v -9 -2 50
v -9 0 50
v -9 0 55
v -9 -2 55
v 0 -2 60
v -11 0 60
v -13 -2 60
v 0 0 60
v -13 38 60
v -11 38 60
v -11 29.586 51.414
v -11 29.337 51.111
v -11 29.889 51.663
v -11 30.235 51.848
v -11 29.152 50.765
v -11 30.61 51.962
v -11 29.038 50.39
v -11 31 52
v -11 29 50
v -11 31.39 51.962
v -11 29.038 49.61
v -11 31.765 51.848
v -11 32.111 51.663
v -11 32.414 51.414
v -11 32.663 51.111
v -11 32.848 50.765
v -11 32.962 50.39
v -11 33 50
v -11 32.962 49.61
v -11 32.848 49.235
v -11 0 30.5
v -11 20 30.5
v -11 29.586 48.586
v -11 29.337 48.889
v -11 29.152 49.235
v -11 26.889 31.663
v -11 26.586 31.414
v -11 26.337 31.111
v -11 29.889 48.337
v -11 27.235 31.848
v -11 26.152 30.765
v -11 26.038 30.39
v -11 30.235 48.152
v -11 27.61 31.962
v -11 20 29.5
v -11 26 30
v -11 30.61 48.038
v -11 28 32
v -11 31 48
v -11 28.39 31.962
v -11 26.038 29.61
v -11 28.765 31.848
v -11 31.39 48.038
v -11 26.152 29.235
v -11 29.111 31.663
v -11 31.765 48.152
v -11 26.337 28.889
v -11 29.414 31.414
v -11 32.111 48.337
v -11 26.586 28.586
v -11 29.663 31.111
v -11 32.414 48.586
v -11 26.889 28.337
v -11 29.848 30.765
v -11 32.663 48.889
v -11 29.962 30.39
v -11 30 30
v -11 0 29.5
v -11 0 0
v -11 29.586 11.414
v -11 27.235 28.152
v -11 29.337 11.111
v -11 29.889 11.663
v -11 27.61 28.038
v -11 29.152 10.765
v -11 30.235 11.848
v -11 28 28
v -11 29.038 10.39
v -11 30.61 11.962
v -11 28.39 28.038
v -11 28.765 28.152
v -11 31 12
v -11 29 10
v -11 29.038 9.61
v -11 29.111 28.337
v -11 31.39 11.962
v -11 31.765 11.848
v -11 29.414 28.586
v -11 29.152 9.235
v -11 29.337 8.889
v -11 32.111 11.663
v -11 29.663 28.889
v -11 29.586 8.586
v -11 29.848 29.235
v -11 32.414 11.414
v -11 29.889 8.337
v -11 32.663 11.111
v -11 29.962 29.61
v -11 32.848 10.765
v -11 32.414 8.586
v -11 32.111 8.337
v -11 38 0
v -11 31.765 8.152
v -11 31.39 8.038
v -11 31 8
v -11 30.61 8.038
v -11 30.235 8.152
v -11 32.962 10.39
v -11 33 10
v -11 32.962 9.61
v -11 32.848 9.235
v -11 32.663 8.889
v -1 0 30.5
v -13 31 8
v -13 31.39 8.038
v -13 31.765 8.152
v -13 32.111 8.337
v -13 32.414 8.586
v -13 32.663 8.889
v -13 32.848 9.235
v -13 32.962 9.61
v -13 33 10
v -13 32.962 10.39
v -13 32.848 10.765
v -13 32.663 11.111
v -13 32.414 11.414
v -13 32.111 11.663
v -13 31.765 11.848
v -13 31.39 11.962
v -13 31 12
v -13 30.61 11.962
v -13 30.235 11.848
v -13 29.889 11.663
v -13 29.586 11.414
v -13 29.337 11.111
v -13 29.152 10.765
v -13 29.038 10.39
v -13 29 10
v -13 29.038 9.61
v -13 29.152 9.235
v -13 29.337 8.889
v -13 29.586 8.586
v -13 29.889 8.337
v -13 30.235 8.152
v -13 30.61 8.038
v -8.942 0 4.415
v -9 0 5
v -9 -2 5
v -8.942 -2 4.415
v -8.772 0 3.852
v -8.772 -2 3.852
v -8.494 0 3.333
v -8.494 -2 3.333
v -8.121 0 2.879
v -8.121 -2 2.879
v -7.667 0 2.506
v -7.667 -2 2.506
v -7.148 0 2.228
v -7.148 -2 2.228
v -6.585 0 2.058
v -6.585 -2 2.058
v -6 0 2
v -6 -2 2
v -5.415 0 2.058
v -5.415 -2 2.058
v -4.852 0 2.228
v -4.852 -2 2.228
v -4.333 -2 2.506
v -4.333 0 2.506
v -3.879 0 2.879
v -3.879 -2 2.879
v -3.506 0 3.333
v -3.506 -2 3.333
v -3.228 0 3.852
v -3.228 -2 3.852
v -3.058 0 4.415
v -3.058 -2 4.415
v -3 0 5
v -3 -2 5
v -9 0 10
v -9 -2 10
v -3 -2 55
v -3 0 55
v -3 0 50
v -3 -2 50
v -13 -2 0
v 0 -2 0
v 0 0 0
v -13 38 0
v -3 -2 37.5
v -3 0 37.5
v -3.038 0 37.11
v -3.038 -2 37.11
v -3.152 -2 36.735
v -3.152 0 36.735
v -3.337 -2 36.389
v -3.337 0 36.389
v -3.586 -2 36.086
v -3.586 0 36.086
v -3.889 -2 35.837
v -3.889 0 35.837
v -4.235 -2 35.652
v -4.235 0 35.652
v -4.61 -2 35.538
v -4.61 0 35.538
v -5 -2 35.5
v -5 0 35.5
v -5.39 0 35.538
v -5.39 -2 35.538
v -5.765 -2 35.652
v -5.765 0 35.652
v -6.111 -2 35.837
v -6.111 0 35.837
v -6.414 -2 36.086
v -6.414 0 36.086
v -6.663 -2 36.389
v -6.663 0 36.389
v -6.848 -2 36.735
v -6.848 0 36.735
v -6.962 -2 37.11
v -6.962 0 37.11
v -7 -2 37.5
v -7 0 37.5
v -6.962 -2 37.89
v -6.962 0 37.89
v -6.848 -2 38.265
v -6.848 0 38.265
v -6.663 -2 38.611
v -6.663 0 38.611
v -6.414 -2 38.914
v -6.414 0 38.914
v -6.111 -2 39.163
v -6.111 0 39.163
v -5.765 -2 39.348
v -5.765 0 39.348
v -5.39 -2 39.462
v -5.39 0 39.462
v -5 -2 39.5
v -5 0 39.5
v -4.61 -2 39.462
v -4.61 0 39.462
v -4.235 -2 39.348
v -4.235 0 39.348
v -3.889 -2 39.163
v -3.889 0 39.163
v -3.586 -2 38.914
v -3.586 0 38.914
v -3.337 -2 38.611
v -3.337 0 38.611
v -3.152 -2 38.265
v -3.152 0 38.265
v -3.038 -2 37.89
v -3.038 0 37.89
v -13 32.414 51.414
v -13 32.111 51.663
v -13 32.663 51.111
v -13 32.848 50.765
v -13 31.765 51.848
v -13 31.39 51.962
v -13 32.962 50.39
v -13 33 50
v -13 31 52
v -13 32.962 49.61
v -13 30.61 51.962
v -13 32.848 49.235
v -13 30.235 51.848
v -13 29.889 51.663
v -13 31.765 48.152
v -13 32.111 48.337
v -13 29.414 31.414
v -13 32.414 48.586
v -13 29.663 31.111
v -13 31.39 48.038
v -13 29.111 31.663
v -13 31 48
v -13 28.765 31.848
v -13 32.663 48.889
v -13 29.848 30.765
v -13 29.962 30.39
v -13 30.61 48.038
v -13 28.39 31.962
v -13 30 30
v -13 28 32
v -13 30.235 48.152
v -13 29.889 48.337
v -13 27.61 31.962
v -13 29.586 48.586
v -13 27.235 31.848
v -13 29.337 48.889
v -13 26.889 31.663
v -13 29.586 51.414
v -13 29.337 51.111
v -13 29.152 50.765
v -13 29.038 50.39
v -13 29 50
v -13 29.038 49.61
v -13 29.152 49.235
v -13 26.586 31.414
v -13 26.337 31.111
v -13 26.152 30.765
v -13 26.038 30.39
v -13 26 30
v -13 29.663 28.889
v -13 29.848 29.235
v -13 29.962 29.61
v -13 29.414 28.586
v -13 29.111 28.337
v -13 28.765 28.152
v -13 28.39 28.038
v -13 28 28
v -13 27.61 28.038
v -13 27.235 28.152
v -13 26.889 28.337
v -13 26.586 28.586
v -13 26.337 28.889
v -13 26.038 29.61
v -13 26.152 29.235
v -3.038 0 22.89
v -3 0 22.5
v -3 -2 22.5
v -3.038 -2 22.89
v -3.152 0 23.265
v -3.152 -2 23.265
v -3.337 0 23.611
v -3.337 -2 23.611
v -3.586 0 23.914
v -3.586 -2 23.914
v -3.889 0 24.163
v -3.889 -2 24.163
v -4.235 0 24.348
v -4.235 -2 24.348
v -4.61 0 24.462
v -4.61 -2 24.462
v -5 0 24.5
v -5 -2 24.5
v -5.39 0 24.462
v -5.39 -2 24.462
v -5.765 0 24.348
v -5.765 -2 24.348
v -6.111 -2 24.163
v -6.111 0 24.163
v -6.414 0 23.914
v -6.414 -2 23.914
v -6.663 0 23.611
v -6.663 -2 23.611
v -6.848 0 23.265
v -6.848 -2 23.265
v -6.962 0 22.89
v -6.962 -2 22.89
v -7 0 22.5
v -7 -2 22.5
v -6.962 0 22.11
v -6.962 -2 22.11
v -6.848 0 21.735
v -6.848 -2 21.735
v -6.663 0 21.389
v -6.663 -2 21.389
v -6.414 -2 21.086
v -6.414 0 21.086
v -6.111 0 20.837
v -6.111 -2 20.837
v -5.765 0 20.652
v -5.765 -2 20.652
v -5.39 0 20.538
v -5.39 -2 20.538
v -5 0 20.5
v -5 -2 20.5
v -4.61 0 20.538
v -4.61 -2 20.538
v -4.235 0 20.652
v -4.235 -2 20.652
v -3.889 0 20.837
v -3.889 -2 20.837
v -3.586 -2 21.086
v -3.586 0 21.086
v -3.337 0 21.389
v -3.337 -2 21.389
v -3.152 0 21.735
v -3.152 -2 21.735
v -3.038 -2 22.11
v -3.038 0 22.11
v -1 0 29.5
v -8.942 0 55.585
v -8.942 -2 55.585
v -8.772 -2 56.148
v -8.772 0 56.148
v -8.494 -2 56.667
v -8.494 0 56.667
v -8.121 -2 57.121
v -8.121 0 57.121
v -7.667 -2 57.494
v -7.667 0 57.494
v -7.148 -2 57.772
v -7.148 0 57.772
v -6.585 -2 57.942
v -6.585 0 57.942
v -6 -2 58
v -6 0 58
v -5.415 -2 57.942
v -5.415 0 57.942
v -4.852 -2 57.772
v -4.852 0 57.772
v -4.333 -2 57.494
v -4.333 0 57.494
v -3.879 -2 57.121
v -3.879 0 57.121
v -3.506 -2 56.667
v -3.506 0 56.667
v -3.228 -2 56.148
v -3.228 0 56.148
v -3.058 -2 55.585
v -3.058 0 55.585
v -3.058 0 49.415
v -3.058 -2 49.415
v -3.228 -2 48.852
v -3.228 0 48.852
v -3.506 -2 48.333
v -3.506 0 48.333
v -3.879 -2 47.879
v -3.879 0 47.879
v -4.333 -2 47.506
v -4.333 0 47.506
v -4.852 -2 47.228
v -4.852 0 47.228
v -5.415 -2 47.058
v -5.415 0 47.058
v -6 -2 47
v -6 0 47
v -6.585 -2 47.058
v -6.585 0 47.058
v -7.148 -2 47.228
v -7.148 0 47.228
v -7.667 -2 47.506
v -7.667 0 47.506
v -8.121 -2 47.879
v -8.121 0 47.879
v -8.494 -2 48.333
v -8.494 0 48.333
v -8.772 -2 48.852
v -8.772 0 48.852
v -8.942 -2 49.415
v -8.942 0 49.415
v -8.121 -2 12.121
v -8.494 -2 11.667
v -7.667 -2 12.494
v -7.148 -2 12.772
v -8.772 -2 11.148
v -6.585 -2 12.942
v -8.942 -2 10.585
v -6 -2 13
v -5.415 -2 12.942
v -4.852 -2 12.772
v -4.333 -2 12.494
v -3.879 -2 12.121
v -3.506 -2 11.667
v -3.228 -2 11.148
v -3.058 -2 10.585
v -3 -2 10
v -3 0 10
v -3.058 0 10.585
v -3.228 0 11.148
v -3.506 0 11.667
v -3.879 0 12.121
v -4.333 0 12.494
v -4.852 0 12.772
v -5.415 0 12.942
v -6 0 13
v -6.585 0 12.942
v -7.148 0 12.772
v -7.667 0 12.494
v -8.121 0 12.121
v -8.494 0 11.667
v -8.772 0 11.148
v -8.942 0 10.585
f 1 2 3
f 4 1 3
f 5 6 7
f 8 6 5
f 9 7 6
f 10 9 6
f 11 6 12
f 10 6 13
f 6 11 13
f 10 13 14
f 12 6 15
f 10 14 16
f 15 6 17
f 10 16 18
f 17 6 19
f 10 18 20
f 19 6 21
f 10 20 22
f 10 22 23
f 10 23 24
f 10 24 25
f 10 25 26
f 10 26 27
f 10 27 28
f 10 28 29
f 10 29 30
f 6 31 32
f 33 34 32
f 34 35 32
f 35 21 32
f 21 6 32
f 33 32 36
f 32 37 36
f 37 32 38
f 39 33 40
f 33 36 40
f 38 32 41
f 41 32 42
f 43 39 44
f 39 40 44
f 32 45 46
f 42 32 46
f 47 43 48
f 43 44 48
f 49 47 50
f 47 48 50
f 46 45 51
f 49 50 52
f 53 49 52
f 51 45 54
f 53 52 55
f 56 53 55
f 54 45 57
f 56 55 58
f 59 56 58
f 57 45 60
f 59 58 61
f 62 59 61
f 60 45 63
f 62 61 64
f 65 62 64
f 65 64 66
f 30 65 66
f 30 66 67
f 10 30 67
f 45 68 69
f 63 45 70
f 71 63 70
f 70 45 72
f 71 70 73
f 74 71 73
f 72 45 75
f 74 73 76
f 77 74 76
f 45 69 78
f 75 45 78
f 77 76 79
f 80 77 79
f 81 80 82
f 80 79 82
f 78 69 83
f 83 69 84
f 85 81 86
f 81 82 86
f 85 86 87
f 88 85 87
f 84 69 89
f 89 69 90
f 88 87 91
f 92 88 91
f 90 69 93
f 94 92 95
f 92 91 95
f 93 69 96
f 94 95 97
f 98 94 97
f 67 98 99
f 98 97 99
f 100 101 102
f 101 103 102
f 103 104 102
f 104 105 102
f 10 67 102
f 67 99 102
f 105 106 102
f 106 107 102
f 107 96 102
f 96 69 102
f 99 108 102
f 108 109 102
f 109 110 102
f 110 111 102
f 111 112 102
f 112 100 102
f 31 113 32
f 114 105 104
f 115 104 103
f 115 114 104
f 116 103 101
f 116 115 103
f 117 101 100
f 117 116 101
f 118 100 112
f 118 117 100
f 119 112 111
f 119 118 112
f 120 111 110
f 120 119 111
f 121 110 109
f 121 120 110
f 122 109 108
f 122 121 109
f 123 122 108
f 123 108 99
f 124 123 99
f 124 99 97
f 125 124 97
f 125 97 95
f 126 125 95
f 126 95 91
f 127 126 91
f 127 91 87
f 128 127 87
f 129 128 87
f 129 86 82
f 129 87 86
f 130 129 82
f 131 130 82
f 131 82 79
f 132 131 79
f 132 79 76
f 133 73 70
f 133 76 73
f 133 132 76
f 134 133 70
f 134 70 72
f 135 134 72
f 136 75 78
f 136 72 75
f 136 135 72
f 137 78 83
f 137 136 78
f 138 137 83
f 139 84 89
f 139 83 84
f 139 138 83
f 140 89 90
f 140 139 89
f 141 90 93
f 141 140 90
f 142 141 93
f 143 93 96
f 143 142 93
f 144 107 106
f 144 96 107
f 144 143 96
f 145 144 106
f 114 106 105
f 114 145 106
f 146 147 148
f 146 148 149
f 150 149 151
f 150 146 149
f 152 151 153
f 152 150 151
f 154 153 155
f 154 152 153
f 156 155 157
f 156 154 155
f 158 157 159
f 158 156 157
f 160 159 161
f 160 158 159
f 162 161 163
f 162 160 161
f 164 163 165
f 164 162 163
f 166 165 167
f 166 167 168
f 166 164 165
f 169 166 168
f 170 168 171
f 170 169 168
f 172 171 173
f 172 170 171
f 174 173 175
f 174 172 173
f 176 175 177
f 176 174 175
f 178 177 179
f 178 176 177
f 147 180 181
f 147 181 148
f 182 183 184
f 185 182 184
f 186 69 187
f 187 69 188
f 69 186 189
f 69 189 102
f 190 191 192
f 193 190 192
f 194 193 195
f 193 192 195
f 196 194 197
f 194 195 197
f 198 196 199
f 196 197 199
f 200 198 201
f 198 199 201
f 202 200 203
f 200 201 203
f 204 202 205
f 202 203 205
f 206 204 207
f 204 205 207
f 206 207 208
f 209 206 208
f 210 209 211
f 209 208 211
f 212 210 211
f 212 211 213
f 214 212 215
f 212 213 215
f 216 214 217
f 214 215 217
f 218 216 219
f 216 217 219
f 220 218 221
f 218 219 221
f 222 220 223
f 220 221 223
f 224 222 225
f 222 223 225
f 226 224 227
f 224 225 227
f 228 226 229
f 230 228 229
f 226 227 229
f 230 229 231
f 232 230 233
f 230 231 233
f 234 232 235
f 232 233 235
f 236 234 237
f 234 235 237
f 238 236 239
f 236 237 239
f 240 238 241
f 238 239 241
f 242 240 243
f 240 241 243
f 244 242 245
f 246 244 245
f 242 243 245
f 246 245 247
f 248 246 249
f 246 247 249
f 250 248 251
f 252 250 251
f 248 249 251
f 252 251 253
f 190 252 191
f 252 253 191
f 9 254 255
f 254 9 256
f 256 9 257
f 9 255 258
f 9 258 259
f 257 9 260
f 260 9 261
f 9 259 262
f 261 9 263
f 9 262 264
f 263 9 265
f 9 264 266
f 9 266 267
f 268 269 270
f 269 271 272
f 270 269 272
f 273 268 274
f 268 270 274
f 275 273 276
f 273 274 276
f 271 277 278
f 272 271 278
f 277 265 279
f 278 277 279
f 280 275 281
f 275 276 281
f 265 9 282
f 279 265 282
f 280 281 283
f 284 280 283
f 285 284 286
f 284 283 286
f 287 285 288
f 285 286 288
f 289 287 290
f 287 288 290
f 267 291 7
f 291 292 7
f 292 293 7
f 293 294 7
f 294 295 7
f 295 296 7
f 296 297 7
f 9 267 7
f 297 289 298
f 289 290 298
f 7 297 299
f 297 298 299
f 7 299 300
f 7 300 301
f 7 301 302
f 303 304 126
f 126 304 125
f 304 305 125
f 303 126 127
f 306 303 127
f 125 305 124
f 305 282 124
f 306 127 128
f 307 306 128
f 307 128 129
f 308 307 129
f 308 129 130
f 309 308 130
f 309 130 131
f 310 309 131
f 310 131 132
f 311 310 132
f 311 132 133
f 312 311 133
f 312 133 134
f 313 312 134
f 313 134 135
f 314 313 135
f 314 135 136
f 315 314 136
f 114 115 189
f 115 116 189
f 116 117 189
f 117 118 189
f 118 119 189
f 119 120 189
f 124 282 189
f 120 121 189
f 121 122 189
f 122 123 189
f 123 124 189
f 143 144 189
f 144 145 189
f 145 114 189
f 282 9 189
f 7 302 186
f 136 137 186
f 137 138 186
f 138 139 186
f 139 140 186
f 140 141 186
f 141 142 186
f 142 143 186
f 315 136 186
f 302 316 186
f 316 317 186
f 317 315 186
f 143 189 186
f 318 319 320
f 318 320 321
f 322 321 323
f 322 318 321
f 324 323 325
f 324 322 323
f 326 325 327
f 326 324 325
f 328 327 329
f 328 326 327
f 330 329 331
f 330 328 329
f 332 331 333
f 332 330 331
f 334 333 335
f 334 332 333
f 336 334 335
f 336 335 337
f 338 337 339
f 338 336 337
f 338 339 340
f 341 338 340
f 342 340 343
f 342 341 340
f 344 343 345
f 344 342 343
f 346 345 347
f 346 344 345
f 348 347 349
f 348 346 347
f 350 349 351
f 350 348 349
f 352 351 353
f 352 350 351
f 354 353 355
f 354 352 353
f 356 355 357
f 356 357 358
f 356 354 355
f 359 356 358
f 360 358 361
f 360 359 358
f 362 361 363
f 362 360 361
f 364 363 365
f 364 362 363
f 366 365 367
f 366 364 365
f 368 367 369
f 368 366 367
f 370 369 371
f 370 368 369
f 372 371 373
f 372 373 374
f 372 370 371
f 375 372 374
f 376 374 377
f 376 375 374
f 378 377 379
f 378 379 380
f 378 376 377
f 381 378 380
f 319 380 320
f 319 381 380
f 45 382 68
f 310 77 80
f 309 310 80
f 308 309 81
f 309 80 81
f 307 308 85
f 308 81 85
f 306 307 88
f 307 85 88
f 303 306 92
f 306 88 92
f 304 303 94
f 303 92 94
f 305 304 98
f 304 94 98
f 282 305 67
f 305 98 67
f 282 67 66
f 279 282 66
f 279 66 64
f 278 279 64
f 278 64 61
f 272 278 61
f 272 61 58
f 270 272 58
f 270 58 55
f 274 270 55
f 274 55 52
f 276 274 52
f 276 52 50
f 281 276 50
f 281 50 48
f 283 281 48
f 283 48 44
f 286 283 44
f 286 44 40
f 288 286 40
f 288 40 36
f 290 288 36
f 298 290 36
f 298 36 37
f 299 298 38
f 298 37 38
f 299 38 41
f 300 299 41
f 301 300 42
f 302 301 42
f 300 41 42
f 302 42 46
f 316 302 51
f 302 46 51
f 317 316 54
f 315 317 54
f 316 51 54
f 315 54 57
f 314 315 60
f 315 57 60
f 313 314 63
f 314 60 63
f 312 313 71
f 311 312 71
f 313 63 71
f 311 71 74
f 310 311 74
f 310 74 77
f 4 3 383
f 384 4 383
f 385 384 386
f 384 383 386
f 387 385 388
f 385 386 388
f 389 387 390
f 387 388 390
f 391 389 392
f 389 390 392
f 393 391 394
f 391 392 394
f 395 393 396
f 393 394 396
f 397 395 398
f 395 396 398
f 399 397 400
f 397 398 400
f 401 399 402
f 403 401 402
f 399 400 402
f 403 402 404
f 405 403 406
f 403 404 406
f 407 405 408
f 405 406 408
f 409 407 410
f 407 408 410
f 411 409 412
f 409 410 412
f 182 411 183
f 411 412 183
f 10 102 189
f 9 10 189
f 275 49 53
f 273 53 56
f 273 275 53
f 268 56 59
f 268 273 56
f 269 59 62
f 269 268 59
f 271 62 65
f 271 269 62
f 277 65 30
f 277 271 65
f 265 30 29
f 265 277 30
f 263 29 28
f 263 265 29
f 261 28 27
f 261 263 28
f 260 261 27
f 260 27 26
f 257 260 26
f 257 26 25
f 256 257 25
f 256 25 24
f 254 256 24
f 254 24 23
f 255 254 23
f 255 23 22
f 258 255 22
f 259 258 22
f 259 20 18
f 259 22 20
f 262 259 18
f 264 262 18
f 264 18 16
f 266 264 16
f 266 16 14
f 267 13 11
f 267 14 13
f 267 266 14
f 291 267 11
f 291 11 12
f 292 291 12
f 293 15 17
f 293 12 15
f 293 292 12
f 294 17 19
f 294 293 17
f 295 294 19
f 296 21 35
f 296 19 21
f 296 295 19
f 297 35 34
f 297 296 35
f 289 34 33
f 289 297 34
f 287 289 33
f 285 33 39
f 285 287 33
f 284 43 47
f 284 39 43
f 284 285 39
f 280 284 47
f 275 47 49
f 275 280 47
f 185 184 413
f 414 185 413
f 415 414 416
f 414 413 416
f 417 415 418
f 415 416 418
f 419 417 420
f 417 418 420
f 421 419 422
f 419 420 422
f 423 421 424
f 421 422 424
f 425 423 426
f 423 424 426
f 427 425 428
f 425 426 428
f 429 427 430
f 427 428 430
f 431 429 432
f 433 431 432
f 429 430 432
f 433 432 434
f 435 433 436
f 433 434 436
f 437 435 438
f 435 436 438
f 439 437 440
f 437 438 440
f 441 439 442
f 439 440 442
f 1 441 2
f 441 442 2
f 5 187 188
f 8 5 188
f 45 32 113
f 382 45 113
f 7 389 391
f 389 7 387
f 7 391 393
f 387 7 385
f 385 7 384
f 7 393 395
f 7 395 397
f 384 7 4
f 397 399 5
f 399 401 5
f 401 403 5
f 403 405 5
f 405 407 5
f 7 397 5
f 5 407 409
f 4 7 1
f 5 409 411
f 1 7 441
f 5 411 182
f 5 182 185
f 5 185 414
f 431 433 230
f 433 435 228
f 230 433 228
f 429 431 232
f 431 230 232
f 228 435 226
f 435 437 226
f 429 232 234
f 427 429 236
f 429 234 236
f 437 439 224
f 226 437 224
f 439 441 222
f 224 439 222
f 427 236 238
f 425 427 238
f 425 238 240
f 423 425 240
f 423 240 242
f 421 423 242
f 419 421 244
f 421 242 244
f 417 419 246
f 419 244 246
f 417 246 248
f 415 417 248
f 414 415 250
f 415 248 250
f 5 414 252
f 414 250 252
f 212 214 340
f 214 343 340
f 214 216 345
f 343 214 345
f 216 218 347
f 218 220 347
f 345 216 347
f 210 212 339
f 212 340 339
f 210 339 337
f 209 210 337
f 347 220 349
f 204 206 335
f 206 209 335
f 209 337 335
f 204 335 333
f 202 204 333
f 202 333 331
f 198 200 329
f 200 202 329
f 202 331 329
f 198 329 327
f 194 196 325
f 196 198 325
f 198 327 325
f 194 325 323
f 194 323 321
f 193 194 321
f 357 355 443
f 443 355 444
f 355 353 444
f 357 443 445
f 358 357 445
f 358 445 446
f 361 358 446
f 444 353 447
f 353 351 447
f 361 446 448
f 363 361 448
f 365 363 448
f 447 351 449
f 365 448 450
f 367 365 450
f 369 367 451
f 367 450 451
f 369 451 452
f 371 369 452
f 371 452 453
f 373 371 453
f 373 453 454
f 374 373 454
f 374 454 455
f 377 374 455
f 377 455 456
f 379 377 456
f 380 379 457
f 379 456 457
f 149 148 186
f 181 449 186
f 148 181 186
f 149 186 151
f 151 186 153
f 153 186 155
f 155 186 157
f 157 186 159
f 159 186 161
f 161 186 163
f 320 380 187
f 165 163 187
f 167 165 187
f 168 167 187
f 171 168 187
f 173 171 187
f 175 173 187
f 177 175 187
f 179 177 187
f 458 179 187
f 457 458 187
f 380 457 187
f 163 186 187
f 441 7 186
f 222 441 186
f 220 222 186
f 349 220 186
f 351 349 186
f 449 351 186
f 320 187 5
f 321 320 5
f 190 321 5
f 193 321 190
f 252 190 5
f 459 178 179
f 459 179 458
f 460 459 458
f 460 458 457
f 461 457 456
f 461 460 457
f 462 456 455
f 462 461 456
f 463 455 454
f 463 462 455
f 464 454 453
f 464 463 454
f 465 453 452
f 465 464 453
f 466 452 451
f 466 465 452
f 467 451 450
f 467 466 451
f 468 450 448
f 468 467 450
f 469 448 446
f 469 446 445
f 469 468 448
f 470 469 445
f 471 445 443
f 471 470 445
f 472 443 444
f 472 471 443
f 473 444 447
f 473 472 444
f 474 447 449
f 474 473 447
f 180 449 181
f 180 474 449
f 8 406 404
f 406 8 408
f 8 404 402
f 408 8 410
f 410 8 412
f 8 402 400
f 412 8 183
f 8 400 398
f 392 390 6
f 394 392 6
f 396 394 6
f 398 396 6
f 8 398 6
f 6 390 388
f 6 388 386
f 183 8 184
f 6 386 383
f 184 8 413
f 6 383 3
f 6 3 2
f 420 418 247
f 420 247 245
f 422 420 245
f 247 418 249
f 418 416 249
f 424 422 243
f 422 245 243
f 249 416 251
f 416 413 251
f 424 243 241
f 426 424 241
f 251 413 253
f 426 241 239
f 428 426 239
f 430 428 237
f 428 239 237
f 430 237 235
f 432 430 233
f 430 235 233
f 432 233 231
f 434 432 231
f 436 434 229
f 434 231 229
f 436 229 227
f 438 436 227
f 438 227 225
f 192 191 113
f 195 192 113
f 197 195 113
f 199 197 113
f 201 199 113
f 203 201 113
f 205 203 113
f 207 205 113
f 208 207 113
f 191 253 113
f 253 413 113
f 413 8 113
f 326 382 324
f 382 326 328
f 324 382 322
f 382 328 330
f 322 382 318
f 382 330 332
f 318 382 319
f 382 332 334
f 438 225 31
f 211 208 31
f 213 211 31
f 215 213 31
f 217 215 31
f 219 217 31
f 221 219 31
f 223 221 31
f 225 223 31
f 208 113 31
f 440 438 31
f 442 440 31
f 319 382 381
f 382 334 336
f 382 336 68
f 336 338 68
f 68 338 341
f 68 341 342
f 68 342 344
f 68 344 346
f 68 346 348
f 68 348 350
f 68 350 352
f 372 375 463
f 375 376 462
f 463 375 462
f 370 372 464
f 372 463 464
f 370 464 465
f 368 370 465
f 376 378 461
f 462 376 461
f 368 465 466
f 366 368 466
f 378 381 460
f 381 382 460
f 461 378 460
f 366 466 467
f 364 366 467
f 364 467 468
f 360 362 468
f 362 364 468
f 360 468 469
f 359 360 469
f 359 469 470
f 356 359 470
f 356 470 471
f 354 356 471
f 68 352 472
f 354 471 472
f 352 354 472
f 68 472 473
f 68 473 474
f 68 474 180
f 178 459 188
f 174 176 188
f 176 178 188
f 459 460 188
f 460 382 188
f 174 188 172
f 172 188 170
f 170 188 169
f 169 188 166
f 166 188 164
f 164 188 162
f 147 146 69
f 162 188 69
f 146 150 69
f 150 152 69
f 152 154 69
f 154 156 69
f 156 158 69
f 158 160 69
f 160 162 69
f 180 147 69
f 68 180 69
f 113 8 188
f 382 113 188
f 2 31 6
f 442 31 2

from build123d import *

# Parameters (mm, degrees)
BOSS_EXTRUDE1_DEPTH = 60
BOSS_EXTRUDE2_DEPTH = 0.5
CUT_EXTRUDE1_DEPTH  = 2
CUT_EXTRUDE2_REACH  = 15
SKETCH6_R           = 2
CUT_EXTRUDE3_REACH  = 4
SKETCH7_R           = 2
SKETCH8_R           = 2
CUT_EXTRUDE4_DEPTH  = 2


with BuildPart() as part:
    # Sketch1 → Boss-Extrude1 (new body)
    with BuildSketch(Plane.XY):
        Polygon((0, 0), (-11, 0), (-11, 38), (-13, 38), (-13, -2), (0, -2), align=None)
    extrude(amount=BOSS_EXTRUDE1_DEPTH)

    # Sketch4 → Boss-Extrude2 (add, symmetric)
    with BuildSketch(Plane.XY.offset(30)):
        Polygon((-11, 20), (-1, 0), (-11, 0), align=None)
    extrude(amount=BOSS_EXTRUDE2_DEPTH, both=True)

    # Sketch5 → Cut-Extrude1 (cut)
    with BuildSketch(Plane(origin=(0, 0, 0), x_dir=(1, 0, 0), z_dir=(0, 1, 0))):
        with BuildLine():
            Line((-3, -5), (-3, -10))
            ThreePointArc((-3, -10), (-6, -13), (-9, -10))
            Line((-9, -10), (-9, -5))
            ThreePointArc((-9, -5), (-6, -2), (-3, -5))
        make_face()
    cut_extrude1 = extrude(amount=-CUT_EXTRUDE1_DEPTH, mode=Mode.SUBTRACT)

    # Mirror1: Cut-Extrude1 across plane
    add(cut_extrude1.mirror(Plane.XY.offset(30)), mode=Mode.SUBTRACT)

    # Sketch6 → Cut-Extrude2 (cut, up to next)
    with BuildSketch(Plane(origin=(-13, 0, 0), x_dir=(0, 0, -1), z_dir=(1, 0, 0)), mode=Mode.PRIVATE) as cut_extrude2_sk1:
        with Locations((-50, 31)):
            Circle(SKETCH6_R)
    cut_extrude2_tool1 = extrude(cut_extrude2_sk1.sketch, amount=CUT_EXTRUDE2_REACH, mode=Mode.PRIVATE) & part.part
    add(cut_extrude2_tool1.solids().sort_by_distance((-13, 31, 50))[0], mode=Mode.SUBTRACT)
    # Sketch6 → Cut-Extrude2 (cut, up to next)
    with BuildSketch(Plane(origin=(-13, 0, 0), x_dir=(0, 0, -1), z_dir=(1, 0, 0)), mode=Mode.PRIVATE) as cut_extrude2_sk2:
        with Locations((-10, 31)):
            Circle(SKETCH6_R)
    cut_extrude2_tool2 = extrude(cut_extrude2_sk2.sketch, amount=CUT_EXTRUDE2_REACH, mode=Mode.PRIVATE) & part.part
    add(cut_extrude2_tool2.solids().sort_by_distance((-13, 31, 10))[0], mode=Mode.SUBTRACT)

    # Sketch7 → Cut-Extrude3 (cut, up to next)
    with BuildSketch(Plane(origin=(-11, 0, 0), x_dir=(0, 0, -1), z_dir=(1, 0, 0)), mode=Mode.PRIVATE) as cut_extrude3_sk1:
        with Locations((-30, 28)):
            Circle(SKETCH7_R)
    cut_extrude3_tool1 = extrude(cut_extrude3_sk1.sketch, amount=-CUT_EXTRUDE3_REACH, mode=Mode.PRIVATE) & part.part
    add(cut_extrude3_tool1.solids().sort_by_distance((-11, 28, 30))[0], mode=Mode.SUBTRACT)

    # Sketch8 → Cut-Extrude4 (cut)
    with BuildSketch(Plane(origin=(0, 0, 0), x_dir=(1, 0, 0), z_dir=(0, 1, 0))):
        with Locations((-5, -37.5)):
            Circle(SKETCH8_R)
    cut_extrude4 = extrude(amount=-CUT_EXTRUDE4_DEPTH, mode=Mode.SUBTRACT)

    # Mirror2: Cut-Extrude4 across plane
    add(cut_extrude4.mirror(Plane.XY.offset(30)), mode=Mode.SUBTRACT)


solid = part.part
